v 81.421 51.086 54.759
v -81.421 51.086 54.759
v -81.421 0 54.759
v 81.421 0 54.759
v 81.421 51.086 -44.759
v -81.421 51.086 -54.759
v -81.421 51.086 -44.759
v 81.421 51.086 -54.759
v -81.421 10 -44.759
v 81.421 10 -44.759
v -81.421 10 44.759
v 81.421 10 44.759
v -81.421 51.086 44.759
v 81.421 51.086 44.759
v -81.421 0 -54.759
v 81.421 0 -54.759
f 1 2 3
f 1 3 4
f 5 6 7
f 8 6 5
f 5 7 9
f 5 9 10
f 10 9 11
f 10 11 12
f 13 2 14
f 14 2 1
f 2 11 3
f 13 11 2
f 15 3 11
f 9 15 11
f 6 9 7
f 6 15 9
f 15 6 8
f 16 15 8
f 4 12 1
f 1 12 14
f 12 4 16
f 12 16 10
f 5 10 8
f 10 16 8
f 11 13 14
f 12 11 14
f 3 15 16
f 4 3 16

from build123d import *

# Parameters (mm, degrees)
SKETCH1_W           = 162.841056138
SKETCH1_H           = 109.517788384
BOSS_EXTRUDE1_DEPTH = 10
SKETCH3_W           = 162.841056138
SKETCH3_H           = 41.085879715
BOSS_EXTRUDE2_DEPTH = 10


with BuildPart() as part:
    # Sketch1 → Boss-Extrude1 (new body)
    with BuildSketch(Plane(origin=(0, 0, 0), x_dir=(1, 0, 0), z_dir=(0, 1, 0))):
        Rectangle(SKETCH1_W, SKETCH1_H)
    extrude(amount=BOSS_EXTRUDE1_DEPTH)

    # Sketch3 → Boss-Extrude2 (add)
    with BuildSketch(Plane.XY.offset(54.758894192)):
        with Locations((0, 30.542939858)):
            Rectangle(SKETCH3_W, SKETCH3_H)
    boss_extrude2 = extrude(amount=-BOSS_EXTRUDE2_DEPTH)

    # Mirror1: Boss-Extrude2 across plane
    add(boss_extrude2.mirror(Plane.XY))


solid = part.part
